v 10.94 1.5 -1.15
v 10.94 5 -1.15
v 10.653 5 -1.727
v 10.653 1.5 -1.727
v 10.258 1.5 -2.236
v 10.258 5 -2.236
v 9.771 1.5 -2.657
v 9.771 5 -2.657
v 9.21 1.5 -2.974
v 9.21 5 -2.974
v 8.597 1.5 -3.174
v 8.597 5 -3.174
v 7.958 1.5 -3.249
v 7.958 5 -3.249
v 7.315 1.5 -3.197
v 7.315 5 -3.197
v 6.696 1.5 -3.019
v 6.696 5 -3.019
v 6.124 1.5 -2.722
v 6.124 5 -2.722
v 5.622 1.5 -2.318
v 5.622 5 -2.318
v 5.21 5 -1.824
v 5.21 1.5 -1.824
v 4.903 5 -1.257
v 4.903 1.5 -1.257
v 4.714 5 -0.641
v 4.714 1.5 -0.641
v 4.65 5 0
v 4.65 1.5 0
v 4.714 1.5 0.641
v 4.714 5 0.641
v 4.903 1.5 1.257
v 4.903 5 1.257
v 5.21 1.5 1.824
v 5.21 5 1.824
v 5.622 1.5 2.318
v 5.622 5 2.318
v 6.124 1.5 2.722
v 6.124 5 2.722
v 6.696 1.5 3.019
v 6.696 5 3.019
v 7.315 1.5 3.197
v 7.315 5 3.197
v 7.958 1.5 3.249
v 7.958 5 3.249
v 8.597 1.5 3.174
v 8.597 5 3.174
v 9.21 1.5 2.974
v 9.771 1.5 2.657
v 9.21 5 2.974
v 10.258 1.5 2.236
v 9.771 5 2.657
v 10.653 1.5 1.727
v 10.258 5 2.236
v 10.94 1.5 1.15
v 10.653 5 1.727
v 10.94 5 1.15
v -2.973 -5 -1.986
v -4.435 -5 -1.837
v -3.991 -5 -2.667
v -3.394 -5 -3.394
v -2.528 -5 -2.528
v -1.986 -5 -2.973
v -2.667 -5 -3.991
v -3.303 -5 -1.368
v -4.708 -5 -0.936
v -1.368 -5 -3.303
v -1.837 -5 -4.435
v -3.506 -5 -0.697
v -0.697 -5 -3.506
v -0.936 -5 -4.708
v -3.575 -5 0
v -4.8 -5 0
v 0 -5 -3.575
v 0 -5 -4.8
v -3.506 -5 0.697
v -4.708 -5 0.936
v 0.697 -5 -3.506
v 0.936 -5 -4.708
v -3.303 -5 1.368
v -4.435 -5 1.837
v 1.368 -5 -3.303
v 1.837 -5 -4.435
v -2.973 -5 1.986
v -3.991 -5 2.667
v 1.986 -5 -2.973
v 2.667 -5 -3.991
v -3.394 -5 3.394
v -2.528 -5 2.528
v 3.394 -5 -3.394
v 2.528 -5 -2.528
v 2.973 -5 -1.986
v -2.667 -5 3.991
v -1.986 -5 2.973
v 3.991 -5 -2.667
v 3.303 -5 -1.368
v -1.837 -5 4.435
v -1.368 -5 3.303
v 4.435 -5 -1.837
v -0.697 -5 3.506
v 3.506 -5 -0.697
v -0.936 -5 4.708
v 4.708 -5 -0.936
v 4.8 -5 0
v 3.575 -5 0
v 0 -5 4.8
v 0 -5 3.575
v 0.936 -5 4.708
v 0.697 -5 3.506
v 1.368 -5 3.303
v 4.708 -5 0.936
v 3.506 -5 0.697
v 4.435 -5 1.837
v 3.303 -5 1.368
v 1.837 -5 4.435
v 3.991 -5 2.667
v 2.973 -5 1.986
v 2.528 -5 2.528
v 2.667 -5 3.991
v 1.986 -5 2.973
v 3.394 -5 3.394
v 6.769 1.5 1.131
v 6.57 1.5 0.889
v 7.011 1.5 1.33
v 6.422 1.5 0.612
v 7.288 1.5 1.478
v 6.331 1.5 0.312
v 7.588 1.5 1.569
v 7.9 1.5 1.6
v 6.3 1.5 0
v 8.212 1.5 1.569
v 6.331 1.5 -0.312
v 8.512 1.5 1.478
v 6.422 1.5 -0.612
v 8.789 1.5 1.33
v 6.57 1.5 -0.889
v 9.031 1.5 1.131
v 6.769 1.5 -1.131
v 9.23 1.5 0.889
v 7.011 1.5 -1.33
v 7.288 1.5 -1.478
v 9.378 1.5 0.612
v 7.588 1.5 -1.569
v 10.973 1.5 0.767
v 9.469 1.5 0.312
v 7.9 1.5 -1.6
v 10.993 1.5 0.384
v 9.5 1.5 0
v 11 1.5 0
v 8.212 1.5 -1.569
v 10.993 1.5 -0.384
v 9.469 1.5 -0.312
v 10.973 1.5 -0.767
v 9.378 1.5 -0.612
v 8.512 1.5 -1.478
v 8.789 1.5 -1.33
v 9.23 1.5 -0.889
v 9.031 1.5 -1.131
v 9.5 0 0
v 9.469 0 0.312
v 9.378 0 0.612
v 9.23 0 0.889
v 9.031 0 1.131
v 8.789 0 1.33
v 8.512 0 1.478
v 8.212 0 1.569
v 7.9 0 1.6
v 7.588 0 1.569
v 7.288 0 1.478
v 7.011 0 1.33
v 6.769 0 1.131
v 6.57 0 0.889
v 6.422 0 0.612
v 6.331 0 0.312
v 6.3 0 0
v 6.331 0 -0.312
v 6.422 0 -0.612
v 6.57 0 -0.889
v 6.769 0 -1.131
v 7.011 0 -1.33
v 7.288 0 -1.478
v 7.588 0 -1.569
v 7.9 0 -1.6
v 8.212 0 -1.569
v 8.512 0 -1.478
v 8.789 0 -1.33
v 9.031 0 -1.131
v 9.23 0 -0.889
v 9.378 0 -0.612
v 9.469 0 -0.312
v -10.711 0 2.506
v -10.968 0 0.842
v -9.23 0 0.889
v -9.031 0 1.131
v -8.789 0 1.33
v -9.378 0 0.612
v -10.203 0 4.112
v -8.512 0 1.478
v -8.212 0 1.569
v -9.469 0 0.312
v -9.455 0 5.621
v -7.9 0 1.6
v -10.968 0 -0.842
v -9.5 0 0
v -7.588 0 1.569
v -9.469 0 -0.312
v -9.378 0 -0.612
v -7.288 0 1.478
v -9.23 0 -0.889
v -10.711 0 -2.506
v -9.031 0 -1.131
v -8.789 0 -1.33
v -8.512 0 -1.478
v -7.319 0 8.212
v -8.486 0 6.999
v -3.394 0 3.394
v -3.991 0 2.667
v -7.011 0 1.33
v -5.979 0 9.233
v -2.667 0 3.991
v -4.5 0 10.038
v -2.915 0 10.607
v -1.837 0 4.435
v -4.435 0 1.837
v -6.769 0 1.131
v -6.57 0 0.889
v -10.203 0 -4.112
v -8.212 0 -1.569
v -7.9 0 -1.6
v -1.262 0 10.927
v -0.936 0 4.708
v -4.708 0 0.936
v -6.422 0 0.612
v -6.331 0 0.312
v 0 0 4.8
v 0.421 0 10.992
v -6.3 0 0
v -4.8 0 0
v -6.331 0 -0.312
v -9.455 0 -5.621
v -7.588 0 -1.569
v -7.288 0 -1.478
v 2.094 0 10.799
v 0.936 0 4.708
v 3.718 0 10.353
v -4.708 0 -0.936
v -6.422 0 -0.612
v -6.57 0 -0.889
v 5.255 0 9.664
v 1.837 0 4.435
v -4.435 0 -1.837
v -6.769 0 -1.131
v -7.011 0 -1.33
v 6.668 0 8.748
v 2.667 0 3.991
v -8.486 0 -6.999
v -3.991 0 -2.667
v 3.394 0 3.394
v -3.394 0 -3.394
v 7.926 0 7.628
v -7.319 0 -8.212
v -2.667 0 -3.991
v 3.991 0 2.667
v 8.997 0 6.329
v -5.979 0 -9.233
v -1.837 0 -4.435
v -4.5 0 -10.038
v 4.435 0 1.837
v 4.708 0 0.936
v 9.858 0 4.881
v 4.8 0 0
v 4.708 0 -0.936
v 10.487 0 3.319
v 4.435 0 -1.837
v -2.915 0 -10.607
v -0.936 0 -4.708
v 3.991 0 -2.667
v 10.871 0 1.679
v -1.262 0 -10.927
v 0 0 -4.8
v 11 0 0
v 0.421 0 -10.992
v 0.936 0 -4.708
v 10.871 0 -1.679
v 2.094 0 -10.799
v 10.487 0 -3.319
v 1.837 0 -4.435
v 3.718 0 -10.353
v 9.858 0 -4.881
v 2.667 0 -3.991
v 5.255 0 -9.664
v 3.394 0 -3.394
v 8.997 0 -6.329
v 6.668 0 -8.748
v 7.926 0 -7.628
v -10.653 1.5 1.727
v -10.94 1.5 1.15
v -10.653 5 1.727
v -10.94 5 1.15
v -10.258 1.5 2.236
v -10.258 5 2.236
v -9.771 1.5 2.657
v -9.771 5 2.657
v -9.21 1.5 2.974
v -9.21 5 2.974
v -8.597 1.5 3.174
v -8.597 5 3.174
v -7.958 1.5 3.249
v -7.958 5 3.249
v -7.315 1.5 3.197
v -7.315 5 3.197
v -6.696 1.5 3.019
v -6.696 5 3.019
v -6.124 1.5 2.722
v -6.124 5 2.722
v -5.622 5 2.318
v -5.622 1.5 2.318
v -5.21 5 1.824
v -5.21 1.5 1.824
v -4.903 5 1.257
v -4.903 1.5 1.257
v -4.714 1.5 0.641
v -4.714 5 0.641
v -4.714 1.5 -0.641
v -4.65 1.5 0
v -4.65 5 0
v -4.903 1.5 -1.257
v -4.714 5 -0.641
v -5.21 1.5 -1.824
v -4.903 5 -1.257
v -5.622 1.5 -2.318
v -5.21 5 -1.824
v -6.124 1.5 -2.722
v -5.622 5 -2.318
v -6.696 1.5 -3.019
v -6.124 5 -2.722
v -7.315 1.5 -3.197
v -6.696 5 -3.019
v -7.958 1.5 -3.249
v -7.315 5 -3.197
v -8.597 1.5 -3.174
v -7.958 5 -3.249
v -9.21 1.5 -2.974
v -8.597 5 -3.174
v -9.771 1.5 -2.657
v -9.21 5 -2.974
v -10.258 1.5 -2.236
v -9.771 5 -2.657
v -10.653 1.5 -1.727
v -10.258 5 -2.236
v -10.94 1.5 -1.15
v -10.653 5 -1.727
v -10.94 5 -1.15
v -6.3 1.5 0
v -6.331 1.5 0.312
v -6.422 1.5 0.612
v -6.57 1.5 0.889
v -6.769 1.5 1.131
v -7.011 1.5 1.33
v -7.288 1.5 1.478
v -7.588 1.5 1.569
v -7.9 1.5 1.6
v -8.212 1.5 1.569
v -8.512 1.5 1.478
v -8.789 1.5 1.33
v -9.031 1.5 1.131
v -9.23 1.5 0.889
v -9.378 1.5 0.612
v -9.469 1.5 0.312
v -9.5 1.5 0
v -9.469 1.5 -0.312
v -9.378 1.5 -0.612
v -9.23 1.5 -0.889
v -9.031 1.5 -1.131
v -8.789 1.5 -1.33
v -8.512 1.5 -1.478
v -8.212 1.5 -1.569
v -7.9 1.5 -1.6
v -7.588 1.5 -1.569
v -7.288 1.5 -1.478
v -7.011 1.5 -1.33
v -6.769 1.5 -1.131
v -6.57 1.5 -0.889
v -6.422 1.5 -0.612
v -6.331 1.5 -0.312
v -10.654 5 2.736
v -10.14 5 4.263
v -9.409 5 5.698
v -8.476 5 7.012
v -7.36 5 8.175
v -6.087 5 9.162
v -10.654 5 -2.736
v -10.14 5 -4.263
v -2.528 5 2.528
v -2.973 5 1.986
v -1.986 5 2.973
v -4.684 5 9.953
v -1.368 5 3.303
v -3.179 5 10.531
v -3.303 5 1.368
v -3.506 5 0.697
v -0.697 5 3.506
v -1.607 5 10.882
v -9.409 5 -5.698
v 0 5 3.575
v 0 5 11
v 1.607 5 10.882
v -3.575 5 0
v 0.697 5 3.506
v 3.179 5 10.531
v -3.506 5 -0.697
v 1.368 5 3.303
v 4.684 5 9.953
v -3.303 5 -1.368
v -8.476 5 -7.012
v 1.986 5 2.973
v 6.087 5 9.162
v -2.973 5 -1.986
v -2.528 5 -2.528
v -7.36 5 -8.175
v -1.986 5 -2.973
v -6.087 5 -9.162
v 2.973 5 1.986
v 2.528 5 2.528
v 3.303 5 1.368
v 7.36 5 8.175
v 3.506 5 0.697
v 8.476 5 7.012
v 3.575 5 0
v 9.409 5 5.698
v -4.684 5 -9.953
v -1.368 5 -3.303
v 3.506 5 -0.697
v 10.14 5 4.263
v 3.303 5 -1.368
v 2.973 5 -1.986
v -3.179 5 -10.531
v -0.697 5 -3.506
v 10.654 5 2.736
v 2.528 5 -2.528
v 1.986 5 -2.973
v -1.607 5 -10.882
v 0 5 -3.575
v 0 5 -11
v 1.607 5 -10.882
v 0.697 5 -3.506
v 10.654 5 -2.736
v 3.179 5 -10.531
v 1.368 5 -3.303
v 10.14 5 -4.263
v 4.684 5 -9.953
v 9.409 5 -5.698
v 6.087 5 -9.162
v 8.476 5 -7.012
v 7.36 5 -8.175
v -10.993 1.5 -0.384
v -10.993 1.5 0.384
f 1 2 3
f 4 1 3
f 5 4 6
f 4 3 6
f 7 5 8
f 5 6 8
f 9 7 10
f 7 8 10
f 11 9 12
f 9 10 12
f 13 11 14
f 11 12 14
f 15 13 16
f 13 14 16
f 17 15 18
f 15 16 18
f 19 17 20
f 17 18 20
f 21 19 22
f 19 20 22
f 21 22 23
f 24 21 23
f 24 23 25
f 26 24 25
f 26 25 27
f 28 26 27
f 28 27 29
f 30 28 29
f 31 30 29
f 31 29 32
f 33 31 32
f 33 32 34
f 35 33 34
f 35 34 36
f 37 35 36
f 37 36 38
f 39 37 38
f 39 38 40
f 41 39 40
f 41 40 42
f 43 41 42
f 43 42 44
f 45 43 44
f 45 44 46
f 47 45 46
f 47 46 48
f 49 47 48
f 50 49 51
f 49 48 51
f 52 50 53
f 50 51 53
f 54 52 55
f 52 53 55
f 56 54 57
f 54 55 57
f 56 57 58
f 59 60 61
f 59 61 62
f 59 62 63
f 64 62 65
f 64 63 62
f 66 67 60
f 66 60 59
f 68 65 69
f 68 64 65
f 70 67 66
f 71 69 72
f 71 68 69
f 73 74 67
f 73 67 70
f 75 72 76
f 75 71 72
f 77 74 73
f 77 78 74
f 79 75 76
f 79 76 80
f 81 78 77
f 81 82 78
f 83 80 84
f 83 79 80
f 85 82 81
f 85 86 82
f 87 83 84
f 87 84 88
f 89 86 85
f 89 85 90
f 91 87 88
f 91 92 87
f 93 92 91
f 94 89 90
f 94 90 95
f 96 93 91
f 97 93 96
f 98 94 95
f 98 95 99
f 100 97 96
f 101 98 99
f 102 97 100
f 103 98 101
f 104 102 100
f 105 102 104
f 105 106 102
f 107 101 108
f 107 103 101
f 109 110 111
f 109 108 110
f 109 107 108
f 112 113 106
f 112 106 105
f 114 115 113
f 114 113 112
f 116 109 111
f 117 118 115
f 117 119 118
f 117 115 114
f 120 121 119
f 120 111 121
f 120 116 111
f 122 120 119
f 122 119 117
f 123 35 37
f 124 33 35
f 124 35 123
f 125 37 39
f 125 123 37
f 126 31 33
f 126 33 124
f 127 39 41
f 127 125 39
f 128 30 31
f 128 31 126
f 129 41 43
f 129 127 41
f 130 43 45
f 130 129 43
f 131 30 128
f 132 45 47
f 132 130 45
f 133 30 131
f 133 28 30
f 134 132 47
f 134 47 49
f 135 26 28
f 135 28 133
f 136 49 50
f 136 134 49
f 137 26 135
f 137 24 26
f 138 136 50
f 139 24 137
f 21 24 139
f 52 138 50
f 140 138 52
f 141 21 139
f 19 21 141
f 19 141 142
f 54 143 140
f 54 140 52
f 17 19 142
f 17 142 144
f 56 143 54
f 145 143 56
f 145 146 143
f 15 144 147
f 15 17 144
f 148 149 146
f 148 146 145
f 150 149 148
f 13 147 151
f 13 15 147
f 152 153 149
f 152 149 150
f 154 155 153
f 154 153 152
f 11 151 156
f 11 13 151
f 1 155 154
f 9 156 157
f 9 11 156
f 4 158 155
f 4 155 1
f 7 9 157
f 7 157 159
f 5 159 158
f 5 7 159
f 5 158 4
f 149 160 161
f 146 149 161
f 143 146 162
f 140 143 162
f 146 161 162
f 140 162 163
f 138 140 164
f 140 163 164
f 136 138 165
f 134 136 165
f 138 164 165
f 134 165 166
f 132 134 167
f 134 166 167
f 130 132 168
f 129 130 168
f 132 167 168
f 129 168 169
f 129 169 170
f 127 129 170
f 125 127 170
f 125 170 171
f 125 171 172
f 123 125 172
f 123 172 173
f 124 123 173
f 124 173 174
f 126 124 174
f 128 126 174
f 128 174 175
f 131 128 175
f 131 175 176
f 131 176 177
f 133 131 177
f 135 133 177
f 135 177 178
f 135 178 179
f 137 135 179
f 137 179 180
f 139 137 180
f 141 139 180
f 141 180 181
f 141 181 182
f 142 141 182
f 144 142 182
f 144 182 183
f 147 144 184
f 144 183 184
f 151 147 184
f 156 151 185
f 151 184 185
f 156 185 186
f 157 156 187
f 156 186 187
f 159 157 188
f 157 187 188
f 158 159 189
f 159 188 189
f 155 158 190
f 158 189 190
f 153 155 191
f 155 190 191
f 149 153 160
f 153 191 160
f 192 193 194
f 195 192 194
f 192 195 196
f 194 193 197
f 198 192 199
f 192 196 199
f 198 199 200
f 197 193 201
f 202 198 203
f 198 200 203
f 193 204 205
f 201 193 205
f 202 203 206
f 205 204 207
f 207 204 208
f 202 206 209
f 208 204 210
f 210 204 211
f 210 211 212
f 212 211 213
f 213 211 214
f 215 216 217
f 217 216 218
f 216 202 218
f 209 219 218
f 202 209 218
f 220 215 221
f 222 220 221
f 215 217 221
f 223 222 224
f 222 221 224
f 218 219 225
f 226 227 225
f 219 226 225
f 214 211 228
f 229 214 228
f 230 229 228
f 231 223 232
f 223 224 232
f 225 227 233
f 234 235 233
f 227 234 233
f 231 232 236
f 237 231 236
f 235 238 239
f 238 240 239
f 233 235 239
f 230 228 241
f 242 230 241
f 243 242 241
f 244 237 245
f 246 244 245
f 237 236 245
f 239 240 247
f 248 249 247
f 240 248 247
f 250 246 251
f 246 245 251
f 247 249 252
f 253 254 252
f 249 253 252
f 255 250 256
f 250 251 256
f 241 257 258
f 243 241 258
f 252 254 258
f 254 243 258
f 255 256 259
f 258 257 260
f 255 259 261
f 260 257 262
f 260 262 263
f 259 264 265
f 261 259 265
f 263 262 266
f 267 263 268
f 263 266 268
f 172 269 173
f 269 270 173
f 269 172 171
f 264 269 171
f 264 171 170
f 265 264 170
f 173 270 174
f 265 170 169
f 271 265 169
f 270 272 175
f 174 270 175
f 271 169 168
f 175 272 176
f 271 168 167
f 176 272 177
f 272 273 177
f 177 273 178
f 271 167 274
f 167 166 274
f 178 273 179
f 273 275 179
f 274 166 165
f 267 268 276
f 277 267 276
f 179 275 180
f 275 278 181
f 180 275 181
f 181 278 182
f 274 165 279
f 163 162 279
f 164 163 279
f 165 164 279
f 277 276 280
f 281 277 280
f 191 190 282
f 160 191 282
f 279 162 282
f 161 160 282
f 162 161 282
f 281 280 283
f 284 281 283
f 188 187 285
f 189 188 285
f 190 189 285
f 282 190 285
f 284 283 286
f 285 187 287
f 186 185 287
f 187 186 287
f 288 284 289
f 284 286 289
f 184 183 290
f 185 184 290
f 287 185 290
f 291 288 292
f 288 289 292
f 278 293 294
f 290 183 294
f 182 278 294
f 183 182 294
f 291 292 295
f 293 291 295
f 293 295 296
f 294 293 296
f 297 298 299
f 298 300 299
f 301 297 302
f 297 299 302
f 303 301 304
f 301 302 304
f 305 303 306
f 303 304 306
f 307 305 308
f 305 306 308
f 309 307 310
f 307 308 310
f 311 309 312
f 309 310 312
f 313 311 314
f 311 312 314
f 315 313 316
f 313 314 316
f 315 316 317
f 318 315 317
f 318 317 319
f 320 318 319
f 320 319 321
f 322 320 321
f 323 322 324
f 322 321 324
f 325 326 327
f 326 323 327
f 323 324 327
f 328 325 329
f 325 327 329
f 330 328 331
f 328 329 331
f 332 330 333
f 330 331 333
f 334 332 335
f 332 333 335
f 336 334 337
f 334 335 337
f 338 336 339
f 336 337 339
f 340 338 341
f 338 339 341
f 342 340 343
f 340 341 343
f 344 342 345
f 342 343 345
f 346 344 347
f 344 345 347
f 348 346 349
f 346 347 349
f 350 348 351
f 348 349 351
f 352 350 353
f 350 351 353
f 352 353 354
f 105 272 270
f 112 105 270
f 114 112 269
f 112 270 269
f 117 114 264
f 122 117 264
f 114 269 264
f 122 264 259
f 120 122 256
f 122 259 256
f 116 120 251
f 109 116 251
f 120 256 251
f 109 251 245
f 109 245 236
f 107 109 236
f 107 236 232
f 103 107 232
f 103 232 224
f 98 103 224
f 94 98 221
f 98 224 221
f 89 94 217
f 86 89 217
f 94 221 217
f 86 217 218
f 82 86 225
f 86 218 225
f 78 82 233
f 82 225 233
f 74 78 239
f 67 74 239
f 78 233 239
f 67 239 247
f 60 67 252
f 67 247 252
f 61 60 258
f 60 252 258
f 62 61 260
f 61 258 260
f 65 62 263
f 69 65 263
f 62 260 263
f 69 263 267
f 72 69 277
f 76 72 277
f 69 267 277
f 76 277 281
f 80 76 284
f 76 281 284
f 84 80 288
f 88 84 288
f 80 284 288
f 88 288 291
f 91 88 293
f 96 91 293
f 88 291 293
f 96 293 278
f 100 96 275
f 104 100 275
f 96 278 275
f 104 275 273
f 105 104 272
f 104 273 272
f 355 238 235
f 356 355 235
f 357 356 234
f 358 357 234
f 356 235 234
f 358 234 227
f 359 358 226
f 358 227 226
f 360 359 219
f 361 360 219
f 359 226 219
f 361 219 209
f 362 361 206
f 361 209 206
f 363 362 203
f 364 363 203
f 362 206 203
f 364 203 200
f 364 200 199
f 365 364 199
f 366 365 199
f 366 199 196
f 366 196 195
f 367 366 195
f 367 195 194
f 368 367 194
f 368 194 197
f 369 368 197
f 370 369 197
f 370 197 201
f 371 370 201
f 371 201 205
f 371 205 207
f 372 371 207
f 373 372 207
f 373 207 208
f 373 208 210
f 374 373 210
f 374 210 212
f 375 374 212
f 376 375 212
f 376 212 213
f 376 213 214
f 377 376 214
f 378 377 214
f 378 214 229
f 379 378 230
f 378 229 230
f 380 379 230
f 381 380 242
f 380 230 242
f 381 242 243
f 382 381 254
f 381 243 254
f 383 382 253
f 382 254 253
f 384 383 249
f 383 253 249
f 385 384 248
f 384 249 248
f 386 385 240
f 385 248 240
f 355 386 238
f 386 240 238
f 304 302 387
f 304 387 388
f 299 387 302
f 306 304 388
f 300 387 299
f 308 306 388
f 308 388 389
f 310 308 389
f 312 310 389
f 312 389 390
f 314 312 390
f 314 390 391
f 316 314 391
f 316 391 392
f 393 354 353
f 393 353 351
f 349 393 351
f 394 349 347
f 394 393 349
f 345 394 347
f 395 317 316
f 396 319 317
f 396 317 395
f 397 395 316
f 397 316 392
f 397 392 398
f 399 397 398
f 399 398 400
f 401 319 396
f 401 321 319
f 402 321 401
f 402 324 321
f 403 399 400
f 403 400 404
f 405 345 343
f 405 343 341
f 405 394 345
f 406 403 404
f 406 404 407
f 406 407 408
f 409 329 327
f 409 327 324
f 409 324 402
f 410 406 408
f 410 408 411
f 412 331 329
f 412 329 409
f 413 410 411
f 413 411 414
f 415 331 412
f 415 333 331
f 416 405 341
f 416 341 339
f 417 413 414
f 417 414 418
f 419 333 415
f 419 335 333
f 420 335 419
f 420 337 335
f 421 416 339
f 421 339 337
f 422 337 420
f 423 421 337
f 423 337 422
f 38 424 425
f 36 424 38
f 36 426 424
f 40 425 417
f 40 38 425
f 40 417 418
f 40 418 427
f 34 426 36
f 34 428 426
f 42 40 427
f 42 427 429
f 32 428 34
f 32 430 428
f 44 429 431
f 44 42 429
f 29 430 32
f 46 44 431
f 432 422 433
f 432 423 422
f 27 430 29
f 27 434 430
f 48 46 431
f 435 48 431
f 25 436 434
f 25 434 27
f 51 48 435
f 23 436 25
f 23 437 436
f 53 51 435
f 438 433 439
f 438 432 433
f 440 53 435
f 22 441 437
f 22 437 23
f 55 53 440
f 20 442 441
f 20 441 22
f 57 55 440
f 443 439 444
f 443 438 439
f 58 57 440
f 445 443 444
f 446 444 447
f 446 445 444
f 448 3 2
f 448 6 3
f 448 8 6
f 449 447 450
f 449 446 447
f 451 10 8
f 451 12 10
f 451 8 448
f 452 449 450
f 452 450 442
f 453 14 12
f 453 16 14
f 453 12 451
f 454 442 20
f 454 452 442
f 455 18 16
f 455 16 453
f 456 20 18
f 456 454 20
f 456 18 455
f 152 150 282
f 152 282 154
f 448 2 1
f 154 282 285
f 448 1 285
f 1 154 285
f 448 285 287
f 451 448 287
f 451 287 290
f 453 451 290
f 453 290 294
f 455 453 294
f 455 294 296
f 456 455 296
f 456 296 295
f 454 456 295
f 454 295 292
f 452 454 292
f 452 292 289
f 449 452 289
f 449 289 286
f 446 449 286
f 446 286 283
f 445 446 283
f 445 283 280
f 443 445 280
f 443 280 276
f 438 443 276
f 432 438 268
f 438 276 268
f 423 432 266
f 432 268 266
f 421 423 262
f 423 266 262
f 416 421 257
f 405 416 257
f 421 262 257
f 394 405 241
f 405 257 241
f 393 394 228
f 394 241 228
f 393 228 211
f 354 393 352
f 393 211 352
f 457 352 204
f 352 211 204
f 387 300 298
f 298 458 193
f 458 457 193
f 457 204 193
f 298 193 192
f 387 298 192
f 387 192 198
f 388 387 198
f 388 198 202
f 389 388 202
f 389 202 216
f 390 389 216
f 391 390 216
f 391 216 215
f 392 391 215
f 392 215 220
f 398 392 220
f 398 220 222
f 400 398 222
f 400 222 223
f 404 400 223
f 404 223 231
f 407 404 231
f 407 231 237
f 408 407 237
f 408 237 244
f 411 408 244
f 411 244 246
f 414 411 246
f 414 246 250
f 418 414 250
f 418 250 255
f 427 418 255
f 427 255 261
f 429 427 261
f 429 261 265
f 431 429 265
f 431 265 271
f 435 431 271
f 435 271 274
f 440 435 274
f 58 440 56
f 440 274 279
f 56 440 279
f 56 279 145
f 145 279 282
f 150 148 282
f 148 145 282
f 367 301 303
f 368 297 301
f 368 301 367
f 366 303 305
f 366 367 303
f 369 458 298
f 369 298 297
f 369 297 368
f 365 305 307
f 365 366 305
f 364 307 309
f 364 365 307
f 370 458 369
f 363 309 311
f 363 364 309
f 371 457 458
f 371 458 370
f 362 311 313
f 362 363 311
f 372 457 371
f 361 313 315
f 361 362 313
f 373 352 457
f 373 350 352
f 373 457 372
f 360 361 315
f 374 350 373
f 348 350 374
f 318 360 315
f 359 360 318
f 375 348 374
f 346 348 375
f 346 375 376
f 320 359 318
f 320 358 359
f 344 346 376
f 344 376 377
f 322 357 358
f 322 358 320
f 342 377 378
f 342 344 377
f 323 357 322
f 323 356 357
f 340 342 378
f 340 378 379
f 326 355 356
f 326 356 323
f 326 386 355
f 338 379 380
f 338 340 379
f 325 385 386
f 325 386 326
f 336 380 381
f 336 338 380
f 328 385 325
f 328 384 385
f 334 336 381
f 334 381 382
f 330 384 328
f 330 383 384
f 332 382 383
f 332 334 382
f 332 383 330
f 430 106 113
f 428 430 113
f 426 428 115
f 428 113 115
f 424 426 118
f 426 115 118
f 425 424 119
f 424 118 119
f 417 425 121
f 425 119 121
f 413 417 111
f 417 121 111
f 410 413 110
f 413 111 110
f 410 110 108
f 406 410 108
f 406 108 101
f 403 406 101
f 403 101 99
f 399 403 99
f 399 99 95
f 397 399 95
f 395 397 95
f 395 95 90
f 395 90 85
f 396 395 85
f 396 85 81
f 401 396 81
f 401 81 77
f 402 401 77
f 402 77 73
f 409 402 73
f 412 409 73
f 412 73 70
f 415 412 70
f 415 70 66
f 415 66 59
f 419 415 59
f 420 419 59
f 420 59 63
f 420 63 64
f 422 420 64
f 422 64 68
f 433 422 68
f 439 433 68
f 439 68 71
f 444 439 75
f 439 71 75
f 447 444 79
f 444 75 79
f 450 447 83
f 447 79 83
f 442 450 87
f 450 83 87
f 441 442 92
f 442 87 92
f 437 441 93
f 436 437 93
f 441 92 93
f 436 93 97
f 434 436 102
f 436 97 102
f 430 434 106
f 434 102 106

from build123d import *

# Parameters (mm, degrees)
CROQUIS1_R              = 11
SALIENTE_EXTRUIR1_DEPTH = 5
CROQUIS2_R              = 4.8
SALIENTE_EXTRUIR2_DEPTH = 5
CROQUIS3_R              = 1.6
CORTAR_EXTRUIR1_DEPTH   = 6
CROQUIS4_R              = 3.575
CORTAR_EXTRUIR2_DEPTH   = 11
CROQUIS5_R              = 3.25
CORTAR_EXTRUIR3_DEPTH   = 3.5


with BuildPart() as part:
    # Croquis1 → Saliente-Extruir1 (new body)
    with BuildSketch(Plane(origin=(0, 0, 0), x_dir=(1, 0, 0), z_dir=(0, 1, 0))):
        Circle(CROQUIS1_R)
    extrude(amount=SALIENTE_EXTRUIR1_DEPTH)

    # Croquis2 → Saliente-Extruir2 (add)
    with BuildSketch(Plane.XZ):
        Circle(CROQUIS2_R)
    extrude(amount=SALIENTE_EXTRUIR2_DEPTH)

    # Croquis3 → Cortar-Extruir1 (cut, through all)
    with BuildSketch(Plane.XZ):
        with Locations((-7.9, 0)):
            Circle(CROQUIS3_R)
        with Locations((7.9, 0)):
            Circle(CROQUIS3_R)
    extrude(amount=-CORTAR_EXTRUIR1_DEPTH, mode=Mode.SUBTRACT)

    # Croquis4 → Cortar-Extruir2 (cut, through all)
    with BuildSketch(Plane.XZ.offset(5)):
        Circle(CROQUIS4_R)
    extrude(amount=-CORTAR_EXTRUIR2_DEPTH, mode=Mode.SUBTRACT)

    # Croquis5 → Cortar-Extruir3 (cut)
    with BuildSketch(Plane(origin=(0, 5, 0), x_dir=(1, 0, 0), z_dir=(0, 1, 0))):
        with Locations((-7.9, 0)):
            Circle(CROQUIS5_R)
        with Locations((7.9, 0)):
            Circle(CROQUIS5_R)
    extrude(amount=-CORTAR_EXTRUIR3_DEPTH, mode=Mode.SUBTRACT)


solid = part.part
